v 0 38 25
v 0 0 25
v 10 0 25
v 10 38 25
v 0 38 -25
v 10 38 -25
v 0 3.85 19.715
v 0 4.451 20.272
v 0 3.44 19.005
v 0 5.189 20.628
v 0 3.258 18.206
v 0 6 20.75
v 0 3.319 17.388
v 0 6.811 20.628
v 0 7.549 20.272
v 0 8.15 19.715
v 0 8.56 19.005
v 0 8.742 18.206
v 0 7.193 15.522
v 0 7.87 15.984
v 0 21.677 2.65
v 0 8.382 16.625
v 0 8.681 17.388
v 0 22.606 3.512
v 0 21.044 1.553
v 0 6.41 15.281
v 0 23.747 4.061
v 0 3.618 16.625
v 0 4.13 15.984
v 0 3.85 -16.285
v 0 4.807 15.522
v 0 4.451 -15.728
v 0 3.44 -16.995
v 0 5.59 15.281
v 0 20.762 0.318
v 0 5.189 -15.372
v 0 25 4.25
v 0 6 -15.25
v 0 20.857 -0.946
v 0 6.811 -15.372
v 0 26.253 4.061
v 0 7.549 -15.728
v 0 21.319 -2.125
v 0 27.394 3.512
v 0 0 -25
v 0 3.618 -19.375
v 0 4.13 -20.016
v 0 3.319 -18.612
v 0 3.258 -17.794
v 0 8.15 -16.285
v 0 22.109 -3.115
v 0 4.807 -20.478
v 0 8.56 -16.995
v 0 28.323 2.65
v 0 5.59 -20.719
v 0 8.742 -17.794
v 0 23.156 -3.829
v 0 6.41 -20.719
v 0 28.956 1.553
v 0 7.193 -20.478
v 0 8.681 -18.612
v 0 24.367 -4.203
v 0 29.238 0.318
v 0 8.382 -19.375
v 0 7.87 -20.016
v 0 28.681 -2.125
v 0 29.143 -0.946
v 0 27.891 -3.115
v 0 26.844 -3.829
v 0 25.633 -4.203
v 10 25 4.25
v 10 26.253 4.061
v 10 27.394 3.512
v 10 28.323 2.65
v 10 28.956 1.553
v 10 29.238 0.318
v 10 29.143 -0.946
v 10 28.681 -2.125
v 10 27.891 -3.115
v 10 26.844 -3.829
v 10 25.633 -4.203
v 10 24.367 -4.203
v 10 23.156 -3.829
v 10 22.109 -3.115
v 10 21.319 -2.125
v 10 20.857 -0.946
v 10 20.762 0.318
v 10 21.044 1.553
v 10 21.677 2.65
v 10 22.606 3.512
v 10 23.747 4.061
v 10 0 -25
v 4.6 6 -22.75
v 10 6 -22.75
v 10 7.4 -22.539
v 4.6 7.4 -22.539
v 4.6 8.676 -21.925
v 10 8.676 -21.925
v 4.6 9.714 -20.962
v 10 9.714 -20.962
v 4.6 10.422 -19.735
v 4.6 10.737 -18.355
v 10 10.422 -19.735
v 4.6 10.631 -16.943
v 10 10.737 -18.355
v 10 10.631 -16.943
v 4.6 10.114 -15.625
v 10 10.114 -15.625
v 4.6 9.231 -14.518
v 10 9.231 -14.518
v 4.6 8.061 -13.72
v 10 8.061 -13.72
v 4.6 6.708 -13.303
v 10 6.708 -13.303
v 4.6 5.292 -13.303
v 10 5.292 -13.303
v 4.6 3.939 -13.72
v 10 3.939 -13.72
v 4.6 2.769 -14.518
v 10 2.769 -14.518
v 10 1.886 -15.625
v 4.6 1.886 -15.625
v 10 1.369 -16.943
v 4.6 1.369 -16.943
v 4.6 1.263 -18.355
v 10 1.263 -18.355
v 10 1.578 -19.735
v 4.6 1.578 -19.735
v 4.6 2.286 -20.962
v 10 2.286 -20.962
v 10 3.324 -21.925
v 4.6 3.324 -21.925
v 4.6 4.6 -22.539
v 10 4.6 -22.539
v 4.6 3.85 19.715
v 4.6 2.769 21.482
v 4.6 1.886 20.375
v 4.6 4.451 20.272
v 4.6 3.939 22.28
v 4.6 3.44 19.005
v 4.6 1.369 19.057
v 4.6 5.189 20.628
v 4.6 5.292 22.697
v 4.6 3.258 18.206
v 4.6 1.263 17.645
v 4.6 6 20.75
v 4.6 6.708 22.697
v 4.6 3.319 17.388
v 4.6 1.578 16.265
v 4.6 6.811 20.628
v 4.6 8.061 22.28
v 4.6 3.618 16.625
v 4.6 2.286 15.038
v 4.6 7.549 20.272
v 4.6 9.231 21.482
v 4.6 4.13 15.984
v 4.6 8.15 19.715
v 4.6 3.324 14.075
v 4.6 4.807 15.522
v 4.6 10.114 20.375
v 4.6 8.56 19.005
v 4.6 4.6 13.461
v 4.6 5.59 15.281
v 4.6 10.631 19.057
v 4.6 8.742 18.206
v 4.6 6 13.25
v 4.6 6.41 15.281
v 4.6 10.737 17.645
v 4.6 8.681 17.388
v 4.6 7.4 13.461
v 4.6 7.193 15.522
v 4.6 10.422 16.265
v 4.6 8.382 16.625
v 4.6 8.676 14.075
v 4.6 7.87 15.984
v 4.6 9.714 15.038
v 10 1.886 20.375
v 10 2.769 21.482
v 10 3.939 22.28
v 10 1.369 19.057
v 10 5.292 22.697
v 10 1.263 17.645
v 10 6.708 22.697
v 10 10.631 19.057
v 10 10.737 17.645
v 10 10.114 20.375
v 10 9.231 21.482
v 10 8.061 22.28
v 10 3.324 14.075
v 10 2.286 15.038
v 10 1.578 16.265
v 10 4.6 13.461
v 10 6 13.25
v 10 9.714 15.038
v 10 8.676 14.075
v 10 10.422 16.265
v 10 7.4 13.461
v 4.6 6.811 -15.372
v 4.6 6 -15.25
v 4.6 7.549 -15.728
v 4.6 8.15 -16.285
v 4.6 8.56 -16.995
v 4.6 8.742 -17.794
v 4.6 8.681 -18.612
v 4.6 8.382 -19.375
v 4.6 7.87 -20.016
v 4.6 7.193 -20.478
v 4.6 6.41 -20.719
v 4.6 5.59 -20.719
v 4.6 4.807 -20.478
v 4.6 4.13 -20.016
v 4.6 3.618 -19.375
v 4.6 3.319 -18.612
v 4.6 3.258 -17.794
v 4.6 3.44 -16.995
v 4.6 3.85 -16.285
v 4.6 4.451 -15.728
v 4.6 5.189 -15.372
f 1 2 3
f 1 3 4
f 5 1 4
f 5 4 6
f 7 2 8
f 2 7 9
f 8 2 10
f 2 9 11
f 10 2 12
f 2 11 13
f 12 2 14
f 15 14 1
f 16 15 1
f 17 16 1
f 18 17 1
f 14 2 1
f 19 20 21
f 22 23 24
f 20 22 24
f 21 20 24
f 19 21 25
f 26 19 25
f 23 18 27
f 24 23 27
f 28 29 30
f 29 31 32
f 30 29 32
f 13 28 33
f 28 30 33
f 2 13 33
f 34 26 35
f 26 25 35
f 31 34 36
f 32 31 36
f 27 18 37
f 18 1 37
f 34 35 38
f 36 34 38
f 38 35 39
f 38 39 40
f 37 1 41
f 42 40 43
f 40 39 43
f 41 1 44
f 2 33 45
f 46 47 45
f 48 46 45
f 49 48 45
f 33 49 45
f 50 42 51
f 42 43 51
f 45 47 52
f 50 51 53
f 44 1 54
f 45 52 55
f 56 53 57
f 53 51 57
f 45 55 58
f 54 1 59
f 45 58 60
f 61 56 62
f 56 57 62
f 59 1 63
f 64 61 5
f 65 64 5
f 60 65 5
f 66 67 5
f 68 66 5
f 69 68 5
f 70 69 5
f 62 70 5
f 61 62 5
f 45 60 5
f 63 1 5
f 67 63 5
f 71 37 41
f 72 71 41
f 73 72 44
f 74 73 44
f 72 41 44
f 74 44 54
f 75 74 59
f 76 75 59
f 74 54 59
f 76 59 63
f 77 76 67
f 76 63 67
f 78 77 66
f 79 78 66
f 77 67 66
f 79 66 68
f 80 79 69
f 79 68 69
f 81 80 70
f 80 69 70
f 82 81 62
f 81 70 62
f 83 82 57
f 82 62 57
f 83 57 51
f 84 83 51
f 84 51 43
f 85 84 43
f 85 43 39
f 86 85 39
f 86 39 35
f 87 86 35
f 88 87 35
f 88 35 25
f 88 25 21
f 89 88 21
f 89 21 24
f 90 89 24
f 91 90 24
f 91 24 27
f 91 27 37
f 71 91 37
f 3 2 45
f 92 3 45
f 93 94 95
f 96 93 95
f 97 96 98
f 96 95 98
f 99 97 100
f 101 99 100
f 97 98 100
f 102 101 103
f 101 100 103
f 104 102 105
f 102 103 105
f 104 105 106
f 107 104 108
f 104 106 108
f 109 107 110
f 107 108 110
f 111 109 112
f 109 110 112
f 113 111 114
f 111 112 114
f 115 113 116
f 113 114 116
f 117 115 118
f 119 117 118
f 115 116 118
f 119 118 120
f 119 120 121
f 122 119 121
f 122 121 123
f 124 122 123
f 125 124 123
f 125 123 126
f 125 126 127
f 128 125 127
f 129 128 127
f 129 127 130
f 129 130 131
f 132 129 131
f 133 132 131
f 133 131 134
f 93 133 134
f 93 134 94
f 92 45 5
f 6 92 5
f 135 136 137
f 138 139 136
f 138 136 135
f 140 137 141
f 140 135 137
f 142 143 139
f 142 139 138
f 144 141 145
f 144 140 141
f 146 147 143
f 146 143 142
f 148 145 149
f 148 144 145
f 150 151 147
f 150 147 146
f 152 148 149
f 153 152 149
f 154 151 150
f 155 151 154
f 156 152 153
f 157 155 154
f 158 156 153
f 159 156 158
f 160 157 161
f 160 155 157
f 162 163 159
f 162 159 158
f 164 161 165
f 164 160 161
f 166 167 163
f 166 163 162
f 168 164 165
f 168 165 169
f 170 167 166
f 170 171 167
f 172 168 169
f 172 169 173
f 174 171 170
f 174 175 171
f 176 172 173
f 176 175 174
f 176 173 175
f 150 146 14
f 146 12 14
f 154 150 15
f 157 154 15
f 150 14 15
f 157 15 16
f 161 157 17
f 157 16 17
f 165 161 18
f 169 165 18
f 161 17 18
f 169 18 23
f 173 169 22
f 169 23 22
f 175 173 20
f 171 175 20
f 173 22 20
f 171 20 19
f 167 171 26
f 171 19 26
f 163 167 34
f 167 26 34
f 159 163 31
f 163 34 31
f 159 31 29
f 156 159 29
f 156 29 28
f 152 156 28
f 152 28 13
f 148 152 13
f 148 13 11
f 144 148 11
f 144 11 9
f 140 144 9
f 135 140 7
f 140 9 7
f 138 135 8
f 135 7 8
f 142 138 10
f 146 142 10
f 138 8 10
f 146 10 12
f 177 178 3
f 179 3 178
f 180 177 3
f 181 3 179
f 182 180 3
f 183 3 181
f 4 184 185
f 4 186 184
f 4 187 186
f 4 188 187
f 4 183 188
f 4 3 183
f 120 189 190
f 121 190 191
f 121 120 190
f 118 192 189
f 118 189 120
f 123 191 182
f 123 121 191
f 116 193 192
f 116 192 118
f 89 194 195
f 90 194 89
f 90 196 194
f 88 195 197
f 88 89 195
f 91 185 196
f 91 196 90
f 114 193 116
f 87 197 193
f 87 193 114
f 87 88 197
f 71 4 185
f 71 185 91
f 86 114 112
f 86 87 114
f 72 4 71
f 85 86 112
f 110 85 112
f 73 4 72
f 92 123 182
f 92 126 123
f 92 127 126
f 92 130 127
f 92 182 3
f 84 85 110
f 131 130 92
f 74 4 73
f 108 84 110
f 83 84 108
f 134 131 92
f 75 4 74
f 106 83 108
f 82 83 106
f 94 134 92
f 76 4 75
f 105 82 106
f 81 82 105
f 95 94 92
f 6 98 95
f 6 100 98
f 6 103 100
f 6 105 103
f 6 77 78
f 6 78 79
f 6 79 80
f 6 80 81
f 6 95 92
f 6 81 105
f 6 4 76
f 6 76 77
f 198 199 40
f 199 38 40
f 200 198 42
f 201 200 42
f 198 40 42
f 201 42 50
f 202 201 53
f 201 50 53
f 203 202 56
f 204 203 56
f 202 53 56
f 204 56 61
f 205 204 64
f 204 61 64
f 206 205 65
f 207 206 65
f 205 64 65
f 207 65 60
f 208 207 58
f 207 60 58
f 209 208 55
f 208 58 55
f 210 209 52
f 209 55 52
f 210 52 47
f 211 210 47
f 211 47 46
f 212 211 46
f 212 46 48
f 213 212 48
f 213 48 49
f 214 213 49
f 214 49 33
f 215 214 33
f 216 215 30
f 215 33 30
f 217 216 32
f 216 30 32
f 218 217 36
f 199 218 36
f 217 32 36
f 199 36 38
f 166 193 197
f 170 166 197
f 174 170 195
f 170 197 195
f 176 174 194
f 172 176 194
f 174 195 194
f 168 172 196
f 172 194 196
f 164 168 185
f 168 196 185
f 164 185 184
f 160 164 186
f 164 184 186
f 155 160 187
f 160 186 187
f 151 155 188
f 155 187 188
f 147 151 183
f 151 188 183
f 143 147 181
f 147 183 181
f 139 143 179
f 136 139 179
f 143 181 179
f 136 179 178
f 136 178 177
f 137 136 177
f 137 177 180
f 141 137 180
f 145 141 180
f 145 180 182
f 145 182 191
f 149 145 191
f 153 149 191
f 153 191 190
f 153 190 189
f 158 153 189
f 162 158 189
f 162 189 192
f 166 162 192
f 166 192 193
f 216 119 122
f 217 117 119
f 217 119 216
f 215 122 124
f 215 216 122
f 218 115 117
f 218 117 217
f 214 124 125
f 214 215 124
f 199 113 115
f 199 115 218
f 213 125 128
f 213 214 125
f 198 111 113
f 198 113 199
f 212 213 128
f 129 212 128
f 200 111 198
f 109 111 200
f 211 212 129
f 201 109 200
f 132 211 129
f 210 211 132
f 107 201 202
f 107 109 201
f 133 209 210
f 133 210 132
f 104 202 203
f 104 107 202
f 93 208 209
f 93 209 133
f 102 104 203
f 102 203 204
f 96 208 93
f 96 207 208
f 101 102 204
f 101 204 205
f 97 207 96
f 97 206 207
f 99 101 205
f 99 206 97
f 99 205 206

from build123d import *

# Parameters (mm, degrees)
SKETCH1_W                                       = 50
SKETCH1_H                                       = 38
BOSS_EXTRUDE1_DEPTH                             = 10
M10X1_5_TAPPED_HOLE1_D                          = 8.5
CBORE_FOR_M5_SOCKET_HEAD_CAP_SCREW1_D           = 5.5
CBORE_FOR_M5_SOCKET_HEAD_CAP_SCREW1_CBORE_D     = 9.5
CBORE_FOR_M5_SOCKET_HEAD_CAP_SCREW1_CBORE_DEPTH = 5.4


with BuildPart() as part:
    # Sketch1 → Boss-Extrude1 (new body)
    with BuildSketch(Plane(origin=(0, 0, 0), x_dir=(0, 0, -1), z_dir=(1, 0, 0))):
        with Locations((0, 19)):
            Rectangle(SKETCH1_W, SKETCH1_H)
    extrude(amount=BOSS_EXTRUDE1_DEPTH)

    # M10x1.5 Tapped Hole1 (through all)
    with Locations(Plane(origin=(10, 0, 0), x_dir=(0, 0, -1), z_dir=(1, 0, 0))):
        with Locations((0, 25)):
            Hole(M10X1_5_TAPPED_HOLE1_D / 2)

    # CBORE for M5 Socket Head Cap Screw1 (through all)
    with Locations(Plane(origin=(10, 0, 0), x_dir=(0, 0, -1), z_dir=(1, 0, 0))):
        with Locations((18, 6), (-18, 6)):
            CounterBoreHole(CBORE_FOR_M5_SOCKET_HEAD_CAP_SCREW1_D / 2, CBORE_FOR_M5_SOCKET_HEAD_CAP_SCREW1_CBORE_D / 2, CBORE_FOR_M5_SOCKET_HEAD_CAP_SCREW1_CBORE_DEPTH)


solid = part.part
